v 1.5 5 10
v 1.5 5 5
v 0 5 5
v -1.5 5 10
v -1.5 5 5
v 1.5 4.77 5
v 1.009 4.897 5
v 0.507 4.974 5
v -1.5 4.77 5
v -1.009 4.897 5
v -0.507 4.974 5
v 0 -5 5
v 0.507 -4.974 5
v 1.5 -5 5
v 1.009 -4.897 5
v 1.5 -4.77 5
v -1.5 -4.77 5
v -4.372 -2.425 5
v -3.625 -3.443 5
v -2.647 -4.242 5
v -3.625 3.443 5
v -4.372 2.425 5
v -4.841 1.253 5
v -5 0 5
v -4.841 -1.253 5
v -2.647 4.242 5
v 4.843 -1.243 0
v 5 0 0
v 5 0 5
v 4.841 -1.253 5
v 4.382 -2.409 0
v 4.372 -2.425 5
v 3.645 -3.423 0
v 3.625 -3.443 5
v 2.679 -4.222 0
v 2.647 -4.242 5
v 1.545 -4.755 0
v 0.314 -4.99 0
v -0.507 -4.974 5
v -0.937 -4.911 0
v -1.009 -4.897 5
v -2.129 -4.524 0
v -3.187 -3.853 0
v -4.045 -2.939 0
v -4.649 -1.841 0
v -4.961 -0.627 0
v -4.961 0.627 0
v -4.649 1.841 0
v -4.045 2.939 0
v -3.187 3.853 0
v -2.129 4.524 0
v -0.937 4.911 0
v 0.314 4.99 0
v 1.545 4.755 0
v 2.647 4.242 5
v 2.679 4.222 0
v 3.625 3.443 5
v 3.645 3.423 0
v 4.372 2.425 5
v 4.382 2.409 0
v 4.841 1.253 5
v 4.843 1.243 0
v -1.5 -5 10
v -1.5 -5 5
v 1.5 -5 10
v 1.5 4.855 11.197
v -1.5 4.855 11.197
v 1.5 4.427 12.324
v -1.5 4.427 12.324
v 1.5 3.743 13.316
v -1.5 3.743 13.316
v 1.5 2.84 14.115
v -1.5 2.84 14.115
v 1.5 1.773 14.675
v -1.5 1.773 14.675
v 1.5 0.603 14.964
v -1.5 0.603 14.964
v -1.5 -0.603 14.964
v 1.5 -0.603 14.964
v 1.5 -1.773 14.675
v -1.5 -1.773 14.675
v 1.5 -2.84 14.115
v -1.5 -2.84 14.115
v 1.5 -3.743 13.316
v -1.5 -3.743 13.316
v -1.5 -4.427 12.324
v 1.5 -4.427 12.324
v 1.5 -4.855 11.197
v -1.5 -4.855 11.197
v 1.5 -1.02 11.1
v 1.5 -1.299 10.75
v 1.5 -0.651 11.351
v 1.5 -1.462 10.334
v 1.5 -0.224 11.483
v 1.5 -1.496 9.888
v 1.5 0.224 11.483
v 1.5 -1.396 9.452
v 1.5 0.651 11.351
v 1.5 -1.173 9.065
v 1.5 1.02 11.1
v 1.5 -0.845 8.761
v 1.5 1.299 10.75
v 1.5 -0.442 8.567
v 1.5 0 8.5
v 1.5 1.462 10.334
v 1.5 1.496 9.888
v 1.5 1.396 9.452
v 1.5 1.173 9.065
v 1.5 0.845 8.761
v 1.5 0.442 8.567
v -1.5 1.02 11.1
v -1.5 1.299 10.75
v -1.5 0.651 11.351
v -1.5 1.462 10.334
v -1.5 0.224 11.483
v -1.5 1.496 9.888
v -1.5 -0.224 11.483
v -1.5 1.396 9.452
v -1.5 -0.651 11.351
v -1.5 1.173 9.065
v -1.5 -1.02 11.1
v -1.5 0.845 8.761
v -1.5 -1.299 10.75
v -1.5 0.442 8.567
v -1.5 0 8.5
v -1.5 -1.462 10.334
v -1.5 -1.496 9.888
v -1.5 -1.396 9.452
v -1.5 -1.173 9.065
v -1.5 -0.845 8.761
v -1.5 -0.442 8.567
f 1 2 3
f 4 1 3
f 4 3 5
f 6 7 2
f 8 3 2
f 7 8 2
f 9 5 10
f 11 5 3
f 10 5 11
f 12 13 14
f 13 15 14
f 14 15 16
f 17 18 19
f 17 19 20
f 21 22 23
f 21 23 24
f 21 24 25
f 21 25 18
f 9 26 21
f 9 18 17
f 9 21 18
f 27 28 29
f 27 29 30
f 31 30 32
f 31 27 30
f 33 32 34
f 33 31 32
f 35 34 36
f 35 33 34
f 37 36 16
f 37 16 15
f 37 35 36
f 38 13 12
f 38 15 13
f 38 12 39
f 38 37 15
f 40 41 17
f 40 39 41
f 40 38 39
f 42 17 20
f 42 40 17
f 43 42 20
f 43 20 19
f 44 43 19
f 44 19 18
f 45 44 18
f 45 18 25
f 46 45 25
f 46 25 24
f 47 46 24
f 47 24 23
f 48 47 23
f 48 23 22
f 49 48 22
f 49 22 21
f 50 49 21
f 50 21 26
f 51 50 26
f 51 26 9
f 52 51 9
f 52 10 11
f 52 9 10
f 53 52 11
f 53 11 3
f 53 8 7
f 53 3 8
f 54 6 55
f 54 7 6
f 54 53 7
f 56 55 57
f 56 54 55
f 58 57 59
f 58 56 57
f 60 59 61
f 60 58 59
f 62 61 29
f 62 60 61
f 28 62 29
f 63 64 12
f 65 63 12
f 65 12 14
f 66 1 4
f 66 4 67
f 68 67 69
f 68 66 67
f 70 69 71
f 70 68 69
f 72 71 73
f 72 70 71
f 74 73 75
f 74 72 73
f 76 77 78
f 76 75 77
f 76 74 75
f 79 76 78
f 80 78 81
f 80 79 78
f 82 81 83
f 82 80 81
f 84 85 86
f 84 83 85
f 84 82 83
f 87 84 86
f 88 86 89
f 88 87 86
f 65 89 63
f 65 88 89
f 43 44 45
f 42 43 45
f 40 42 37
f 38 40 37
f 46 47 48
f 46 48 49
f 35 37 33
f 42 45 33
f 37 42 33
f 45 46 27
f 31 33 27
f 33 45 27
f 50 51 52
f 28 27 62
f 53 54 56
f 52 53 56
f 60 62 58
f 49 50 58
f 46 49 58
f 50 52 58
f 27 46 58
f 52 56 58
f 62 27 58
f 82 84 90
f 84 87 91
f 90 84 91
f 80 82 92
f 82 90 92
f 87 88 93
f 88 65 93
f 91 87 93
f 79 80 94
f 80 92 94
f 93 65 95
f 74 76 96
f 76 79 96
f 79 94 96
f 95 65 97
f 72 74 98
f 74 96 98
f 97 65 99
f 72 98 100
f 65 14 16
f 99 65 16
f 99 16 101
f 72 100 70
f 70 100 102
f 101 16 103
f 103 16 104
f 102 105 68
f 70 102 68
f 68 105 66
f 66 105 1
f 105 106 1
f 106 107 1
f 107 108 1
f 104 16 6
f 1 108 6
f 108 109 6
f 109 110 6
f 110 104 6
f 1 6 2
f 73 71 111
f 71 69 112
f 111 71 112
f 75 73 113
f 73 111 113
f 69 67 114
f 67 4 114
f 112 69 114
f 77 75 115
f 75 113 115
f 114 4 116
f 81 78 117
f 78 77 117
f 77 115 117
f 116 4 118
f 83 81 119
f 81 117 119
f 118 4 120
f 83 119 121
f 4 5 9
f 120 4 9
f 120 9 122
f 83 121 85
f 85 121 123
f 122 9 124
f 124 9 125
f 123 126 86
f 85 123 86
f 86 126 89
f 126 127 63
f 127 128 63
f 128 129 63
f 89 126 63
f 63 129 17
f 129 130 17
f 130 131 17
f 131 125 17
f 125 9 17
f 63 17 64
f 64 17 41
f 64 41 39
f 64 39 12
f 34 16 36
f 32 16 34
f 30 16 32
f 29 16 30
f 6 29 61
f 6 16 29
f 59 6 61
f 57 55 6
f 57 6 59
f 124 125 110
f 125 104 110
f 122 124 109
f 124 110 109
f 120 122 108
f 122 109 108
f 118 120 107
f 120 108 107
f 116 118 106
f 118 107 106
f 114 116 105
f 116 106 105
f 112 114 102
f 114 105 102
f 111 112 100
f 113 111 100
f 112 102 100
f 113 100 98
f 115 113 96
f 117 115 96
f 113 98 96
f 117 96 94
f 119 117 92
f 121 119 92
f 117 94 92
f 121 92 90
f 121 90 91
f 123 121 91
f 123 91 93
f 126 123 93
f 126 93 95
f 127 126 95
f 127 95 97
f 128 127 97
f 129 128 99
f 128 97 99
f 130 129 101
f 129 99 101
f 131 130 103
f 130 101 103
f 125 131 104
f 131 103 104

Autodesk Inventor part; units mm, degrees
ref_plane "YZ Plane" through (0, 0, 0) normal (1, 0, 0) x (0, 1, 0)
ref_plane "XZ Plane" through (0, 0, 0) normal (0, 1, 0) x (-1, 0, 0)
ref_plane "XY Plane" through (0, 0, 0) normal (0, 0, 1) x (1, 0, 0)
sketch "Sketch1" plane through (0, 0, 0) normal (0, 0, 1) x (1, 0, 0)
  circle A0 centre (0, 0) radius 5
  dimension "d0" = 10
extrude "Extrusion1" add sketch "Sketch1" along normal blind 5
sketch "Sketch2" plane through (0, 0, 5) normal (0, 0, 1) x (1, 0, 0)
  line L0 (-1.5, -5) -> (1.5, -5)
  line L1 (1.5, -5) -> (1.5, 5)
  line L2 (1.5, 5) -> (-1.5, 5)
  line L3 (-1.5, 5) -> (-1.5, -5)
  line L4 (-1.5, -5) -> (1.5, 5) construction
  line L5 (1.5, -5) -> (-1.5, 5) construction
  circle A0 centre (0, 0) radius 5 projected
  dimension "d3" = 3
  dimension "d4" = 10
extrude "Extrusion2" add sketch "Sketch2" along normal blind 10 contours L3 A0 L0 | A0 L1 L0 | A0 L3 L1 | L3 L2 A0 | A0 L2 L1
sketch "Sketch3" plane through (1.5, -4.7697, 5) normal (1, 0, 0) x (0, 0, -1)
  line L0 (0, -0.2303) -> (-10, -0.2303) projected
  line L1 (-10, 9.7697) -> (0, -0.2303)
  line L2 (0, -0.2303) -> (0, 9.7697)
  line L3 (-10, 9.7697) -> (-10, -0.2303) projected
  line L4 (0, 9.7697) -> (-10, -0.2303)
  circle A0 centre (-5, 4.7697) radius 1.5
  point P0 (5, 4.7697)
  dimension "d7" = 3
extrude "Extrusion3" cut sketch "Sketch3" against normal through all contours A0 L4 L1 | L1 L4 A0 | A0 L1 L4 | L1 A0 L4
sketch "Sketch4" plane through (1.5, -4.7697, 5) normal (1, 0, 0) x (0, 0, -1)
  circle A0 centre (-5, 4.7697) radius 1.5 projected
  circle A1 centre (-5, 4.7697) radius 5
  line L0 (-5, 4.7697) -> (-5, 9.7697)
  line L1 (-5, 4.7697) -> (-5, -0.2303)
  line L2 (0, -0.2303) -> (-10, -0.2303) projected
  line L3 (-10, -0.2303) -> (-10, 9.7697) projected
  line L4 (0, 9.7697) -> (-10, 9.7697) projected
  point P0 (5, 4.7697)
  point P1 (-10, 4.7697)
extrude "Extrusion4" cut sketch "Sketch4" against normal through all contours A1 L3 L4 | L2 L3 A1
properties part number "pm connector"
